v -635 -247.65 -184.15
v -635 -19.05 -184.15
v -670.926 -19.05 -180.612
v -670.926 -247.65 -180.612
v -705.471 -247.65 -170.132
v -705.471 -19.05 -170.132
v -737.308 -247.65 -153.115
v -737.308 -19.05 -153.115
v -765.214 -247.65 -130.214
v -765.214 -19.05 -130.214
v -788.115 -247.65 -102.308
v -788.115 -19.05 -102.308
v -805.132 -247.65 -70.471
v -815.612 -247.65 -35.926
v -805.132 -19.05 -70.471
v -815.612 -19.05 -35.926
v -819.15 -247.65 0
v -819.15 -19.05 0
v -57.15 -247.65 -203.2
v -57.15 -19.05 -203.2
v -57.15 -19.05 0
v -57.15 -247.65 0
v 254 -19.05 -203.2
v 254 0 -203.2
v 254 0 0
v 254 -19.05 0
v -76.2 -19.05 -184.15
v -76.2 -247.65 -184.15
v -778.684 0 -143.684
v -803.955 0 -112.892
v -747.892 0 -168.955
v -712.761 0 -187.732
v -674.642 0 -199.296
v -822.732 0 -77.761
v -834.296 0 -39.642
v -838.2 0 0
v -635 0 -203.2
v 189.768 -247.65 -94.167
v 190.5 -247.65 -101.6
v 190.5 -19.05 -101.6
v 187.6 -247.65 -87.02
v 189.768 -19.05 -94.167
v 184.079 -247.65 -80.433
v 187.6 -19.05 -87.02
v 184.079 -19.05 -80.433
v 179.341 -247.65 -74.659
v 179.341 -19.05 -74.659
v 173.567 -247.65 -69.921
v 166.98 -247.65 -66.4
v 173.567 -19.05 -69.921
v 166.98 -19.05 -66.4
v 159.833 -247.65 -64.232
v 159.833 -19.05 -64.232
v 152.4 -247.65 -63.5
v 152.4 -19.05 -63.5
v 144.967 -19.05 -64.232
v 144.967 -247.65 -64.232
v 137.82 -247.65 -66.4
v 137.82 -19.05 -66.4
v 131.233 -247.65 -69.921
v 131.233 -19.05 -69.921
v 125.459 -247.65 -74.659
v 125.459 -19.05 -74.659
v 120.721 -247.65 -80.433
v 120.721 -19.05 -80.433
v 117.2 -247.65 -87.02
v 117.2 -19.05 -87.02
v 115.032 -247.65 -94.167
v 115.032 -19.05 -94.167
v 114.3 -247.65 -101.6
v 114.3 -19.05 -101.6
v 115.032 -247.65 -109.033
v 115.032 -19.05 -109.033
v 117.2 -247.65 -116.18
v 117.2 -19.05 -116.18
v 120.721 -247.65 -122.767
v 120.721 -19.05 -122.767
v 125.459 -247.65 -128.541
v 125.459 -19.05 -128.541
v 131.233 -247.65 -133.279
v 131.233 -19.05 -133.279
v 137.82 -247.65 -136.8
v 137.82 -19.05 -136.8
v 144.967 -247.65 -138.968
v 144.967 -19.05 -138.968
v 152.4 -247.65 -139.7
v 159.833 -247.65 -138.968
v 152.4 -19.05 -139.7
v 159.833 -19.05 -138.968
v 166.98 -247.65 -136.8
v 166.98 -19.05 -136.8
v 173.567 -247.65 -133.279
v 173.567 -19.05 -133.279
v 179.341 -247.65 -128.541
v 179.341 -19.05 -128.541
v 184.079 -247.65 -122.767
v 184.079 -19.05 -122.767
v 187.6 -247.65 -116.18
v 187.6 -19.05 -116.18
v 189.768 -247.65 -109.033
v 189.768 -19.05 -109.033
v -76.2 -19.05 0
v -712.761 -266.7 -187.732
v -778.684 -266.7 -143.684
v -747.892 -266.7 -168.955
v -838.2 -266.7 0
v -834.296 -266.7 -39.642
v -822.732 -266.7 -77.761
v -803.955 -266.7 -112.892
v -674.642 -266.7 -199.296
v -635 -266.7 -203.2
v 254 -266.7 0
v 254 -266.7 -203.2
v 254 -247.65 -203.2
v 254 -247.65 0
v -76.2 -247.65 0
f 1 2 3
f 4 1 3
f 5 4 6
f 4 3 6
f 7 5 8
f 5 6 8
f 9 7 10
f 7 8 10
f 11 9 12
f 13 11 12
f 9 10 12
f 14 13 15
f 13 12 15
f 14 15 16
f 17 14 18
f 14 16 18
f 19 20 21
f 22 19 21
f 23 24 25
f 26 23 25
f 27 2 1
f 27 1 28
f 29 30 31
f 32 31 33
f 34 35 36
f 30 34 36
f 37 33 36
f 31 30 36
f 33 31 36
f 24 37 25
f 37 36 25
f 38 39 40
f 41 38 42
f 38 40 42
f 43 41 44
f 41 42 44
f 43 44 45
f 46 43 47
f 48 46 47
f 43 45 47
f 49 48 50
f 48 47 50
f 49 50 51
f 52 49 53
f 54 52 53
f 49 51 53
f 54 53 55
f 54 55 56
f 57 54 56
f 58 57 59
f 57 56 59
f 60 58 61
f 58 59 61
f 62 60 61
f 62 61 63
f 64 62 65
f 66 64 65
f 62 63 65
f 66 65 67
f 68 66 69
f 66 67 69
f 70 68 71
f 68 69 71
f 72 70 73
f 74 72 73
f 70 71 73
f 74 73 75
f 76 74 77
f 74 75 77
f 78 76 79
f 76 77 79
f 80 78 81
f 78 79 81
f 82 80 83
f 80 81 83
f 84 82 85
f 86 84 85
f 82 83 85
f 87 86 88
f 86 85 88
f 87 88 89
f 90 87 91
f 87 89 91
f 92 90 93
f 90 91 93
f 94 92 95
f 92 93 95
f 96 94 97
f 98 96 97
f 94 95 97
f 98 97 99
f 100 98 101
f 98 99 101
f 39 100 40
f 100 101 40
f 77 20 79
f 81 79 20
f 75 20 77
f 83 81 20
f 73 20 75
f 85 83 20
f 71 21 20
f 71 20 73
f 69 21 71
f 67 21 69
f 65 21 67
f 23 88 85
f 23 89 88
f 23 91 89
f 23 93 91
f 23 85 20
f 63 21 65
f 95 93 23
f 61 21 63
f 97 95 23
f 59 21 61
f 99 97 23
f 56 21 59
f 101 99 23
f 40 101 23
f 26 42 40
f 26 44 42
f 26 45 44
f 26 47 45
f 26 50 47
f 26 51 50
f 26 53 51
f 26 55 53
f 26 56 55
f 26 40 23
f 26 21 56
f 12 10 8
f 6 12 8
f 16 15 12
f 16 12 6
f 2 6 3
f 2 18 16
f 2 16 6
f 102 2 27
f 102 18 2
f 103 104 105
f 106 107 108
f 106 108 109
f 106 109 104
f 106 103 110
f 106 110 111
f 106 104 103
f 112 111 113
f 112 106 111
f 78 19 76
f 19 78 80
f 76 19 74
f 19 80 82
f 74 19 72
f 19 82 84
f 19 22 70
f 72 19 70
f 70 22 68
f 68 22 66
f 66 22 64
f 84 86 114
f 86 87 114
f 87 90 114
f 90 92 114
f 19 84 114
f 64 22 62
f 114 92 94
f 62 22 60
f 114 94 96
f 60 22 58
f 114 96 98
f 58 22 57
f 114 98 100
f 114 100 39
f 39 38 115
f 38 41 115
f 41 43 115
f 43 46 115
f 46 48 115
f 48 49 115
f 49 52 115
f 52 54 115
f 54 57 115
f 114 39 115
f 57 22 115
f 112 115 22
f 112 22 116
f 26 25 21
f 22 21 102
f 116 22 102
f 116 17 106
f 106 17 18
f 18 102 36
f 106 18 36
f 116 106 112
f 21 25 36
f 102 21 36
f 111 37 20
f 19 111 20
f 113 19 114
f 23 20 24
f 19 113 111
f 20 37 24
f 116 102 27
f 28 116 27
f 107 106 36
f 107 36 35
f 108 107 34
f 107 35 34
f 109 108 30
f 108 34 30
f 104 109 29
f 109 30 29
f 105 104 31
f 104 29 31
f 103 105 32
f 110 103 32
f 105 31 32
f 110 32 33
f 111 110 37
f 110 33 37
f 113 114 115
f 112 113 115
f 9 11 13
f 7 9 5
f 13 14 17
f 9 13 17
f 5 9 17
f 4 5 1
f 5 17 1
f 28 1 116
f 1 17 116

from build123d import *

# Parameters (mm, degrees)
F0_W     = 254
F0_H     = 203.2
F1_DEPTH = 19.05
F2_R     = 38.1
F2_W     = 558.8
F2_H     = 19.05
F3_DEPTH = 228.6
F4_W     = 254
F4_H     = 203.2
F4_W_2   = 57.15
F5_DEPTH = 19.05


with BuildPart() as f1:
    # F0 (on Front) → F1 (new body)
    with BuildSketch(Plane.XZ):
        with BuildLine():
            Line((0, -203.2), (0, 0))
            Line((0, 0), (-431.8, 0))
            ThreePointArc((-431.8, 0), (-491.3159020629, -143.6840979371), (-635, -203.2))
            Line((-635, -203.2), (0, -203.2))
        make_face()
        with BuildLine():
            Line((-635, -203.2), (-635, 0))
            Line((-635, 0), (-838.2, 0))
            ThreePointArc((-838.2, 0), (-778.6840979371, -143.6840979371), (-635, -203.2))
        make_face()
        with BuildLine():
            ThreePointArc((-635, -203.2), (-491.3159020629, -143.6840979371), (-431.8, 0))
            Line((-431.8, 0), (-635, 0))
            Line((-635, 0), (-635, -203.2))
        make_face()
        with Locations((127, -101.6)):
            Rectangle(F0_W, F0_H)
    extrude(amount=F1_DEPTH)

    # F2 (on face) → F3 (join)
    with BuildSketch(Plane.XZ.offset(19.05)):
        with Locations((152.4, -101.6)):
            Circle(F2_R)
        Polygon((-57.15, -203.2), (-57.15, 0), (-76.2, 0), (-76.2, -184.15), (-76.2, -203.2), align=None)
        with Locations((-355.6, -193.675)):
            Rectangle(F2_W, F2_H)
        with BuildLine():
            Line((-635, -203.2), (-635, -184.15))
            ThreePointArc((-635, -184.15), (-765.2137137555, -130.2137137555), (-819.15, 0))
            Line((-819.15, 0), (-838.2, 0))
            ThreePointArc((-838.2, 0), (-778.6840979371, -143.6840979371), (-635, -203.2))
        make_face()
    extrude(amount=F3_DEPTH)

    # F4 (on face) → F5 (join)
    with BuildSketch(Plane.XZ.offset(247.65)):
        with Locations((127, -101.6)):
            Rectangle(F4_W, F4_H)
        with Locations((-28.575, -101.6)):
            Rectangle(F4_W_2, F4_H)
        with BuildLine():
            ThreePointArc((-838.2, 0), (-778.6840979371, -143.6840979371), (-635, -203.2))
            Line((-635, -203.2), (-635, -184.15))
            ThreePointArc((-635, -184.15), (-765.2137137555, -130.2137137555), (-819.15, 0))
            Line((-819.15, 0), (-838.2, 0))
        make_face()
        with BuildLine():
            Line((-635, -184.15), (-635, 0))
            Line((-635, 0), (-819.15, 0))
            ThreePointArc((-819.15, 0), (-765.2137137555, -130.2137137555), (-635, -184.15))
        make_face()
        with BuildLine():
            Line((-76.2, -184.15), (-76.2, 0))
            Line((-76.2, 0), (-431.8, 0))
            ThreePointArc((-431.8, 0), (-463.6153953484, -109.1675651849), (-549.0987922087, -184.15))
            Line((-549.0987922087, -184.15), (-76.2, -184.15))
        make_face()
        with BuildLine():
            Line((-57.15, -203.2), (-57.15, 0))
            Line((-57.15, 0), (-76.2, 0))
            Line((-76.2, 0), (-76.2, -184.15))
            Line((-76.2, -184.15), (-549.0987922087, -184.15))
            ThreePointArc((-549.0987922087, -184.15), (-591.0059094877, -198.380341768), (-635, -203.2))
            Line((-635, -203.2), (-57.15, -203.2))
        make_face()
        with BuildLine():
            Line((-635, -184.15), (-635, -203.2))
            ThreePointArc((-635, -203.2), (-591.0059094877, -198.380341768), (-549.0987922087, -184.15))
            Line((-549.0987922087, -184.15), (-635, -184.15))
        make_face()
        with BuildLine():
            ThreePointArc((-549.0987922087, -184.15), (-463.6153953484, -109.1675651849), (-431.8, 0))
            Line((-431.8, 0), (-635, 0))
            Line((-635, 0), (-635, -184.15))
            Line((-635, -184.15), (-549.0987922087, -184.15))
        make_face()
    extrude(amount=F5_DEPTH)


solid = f1.part
